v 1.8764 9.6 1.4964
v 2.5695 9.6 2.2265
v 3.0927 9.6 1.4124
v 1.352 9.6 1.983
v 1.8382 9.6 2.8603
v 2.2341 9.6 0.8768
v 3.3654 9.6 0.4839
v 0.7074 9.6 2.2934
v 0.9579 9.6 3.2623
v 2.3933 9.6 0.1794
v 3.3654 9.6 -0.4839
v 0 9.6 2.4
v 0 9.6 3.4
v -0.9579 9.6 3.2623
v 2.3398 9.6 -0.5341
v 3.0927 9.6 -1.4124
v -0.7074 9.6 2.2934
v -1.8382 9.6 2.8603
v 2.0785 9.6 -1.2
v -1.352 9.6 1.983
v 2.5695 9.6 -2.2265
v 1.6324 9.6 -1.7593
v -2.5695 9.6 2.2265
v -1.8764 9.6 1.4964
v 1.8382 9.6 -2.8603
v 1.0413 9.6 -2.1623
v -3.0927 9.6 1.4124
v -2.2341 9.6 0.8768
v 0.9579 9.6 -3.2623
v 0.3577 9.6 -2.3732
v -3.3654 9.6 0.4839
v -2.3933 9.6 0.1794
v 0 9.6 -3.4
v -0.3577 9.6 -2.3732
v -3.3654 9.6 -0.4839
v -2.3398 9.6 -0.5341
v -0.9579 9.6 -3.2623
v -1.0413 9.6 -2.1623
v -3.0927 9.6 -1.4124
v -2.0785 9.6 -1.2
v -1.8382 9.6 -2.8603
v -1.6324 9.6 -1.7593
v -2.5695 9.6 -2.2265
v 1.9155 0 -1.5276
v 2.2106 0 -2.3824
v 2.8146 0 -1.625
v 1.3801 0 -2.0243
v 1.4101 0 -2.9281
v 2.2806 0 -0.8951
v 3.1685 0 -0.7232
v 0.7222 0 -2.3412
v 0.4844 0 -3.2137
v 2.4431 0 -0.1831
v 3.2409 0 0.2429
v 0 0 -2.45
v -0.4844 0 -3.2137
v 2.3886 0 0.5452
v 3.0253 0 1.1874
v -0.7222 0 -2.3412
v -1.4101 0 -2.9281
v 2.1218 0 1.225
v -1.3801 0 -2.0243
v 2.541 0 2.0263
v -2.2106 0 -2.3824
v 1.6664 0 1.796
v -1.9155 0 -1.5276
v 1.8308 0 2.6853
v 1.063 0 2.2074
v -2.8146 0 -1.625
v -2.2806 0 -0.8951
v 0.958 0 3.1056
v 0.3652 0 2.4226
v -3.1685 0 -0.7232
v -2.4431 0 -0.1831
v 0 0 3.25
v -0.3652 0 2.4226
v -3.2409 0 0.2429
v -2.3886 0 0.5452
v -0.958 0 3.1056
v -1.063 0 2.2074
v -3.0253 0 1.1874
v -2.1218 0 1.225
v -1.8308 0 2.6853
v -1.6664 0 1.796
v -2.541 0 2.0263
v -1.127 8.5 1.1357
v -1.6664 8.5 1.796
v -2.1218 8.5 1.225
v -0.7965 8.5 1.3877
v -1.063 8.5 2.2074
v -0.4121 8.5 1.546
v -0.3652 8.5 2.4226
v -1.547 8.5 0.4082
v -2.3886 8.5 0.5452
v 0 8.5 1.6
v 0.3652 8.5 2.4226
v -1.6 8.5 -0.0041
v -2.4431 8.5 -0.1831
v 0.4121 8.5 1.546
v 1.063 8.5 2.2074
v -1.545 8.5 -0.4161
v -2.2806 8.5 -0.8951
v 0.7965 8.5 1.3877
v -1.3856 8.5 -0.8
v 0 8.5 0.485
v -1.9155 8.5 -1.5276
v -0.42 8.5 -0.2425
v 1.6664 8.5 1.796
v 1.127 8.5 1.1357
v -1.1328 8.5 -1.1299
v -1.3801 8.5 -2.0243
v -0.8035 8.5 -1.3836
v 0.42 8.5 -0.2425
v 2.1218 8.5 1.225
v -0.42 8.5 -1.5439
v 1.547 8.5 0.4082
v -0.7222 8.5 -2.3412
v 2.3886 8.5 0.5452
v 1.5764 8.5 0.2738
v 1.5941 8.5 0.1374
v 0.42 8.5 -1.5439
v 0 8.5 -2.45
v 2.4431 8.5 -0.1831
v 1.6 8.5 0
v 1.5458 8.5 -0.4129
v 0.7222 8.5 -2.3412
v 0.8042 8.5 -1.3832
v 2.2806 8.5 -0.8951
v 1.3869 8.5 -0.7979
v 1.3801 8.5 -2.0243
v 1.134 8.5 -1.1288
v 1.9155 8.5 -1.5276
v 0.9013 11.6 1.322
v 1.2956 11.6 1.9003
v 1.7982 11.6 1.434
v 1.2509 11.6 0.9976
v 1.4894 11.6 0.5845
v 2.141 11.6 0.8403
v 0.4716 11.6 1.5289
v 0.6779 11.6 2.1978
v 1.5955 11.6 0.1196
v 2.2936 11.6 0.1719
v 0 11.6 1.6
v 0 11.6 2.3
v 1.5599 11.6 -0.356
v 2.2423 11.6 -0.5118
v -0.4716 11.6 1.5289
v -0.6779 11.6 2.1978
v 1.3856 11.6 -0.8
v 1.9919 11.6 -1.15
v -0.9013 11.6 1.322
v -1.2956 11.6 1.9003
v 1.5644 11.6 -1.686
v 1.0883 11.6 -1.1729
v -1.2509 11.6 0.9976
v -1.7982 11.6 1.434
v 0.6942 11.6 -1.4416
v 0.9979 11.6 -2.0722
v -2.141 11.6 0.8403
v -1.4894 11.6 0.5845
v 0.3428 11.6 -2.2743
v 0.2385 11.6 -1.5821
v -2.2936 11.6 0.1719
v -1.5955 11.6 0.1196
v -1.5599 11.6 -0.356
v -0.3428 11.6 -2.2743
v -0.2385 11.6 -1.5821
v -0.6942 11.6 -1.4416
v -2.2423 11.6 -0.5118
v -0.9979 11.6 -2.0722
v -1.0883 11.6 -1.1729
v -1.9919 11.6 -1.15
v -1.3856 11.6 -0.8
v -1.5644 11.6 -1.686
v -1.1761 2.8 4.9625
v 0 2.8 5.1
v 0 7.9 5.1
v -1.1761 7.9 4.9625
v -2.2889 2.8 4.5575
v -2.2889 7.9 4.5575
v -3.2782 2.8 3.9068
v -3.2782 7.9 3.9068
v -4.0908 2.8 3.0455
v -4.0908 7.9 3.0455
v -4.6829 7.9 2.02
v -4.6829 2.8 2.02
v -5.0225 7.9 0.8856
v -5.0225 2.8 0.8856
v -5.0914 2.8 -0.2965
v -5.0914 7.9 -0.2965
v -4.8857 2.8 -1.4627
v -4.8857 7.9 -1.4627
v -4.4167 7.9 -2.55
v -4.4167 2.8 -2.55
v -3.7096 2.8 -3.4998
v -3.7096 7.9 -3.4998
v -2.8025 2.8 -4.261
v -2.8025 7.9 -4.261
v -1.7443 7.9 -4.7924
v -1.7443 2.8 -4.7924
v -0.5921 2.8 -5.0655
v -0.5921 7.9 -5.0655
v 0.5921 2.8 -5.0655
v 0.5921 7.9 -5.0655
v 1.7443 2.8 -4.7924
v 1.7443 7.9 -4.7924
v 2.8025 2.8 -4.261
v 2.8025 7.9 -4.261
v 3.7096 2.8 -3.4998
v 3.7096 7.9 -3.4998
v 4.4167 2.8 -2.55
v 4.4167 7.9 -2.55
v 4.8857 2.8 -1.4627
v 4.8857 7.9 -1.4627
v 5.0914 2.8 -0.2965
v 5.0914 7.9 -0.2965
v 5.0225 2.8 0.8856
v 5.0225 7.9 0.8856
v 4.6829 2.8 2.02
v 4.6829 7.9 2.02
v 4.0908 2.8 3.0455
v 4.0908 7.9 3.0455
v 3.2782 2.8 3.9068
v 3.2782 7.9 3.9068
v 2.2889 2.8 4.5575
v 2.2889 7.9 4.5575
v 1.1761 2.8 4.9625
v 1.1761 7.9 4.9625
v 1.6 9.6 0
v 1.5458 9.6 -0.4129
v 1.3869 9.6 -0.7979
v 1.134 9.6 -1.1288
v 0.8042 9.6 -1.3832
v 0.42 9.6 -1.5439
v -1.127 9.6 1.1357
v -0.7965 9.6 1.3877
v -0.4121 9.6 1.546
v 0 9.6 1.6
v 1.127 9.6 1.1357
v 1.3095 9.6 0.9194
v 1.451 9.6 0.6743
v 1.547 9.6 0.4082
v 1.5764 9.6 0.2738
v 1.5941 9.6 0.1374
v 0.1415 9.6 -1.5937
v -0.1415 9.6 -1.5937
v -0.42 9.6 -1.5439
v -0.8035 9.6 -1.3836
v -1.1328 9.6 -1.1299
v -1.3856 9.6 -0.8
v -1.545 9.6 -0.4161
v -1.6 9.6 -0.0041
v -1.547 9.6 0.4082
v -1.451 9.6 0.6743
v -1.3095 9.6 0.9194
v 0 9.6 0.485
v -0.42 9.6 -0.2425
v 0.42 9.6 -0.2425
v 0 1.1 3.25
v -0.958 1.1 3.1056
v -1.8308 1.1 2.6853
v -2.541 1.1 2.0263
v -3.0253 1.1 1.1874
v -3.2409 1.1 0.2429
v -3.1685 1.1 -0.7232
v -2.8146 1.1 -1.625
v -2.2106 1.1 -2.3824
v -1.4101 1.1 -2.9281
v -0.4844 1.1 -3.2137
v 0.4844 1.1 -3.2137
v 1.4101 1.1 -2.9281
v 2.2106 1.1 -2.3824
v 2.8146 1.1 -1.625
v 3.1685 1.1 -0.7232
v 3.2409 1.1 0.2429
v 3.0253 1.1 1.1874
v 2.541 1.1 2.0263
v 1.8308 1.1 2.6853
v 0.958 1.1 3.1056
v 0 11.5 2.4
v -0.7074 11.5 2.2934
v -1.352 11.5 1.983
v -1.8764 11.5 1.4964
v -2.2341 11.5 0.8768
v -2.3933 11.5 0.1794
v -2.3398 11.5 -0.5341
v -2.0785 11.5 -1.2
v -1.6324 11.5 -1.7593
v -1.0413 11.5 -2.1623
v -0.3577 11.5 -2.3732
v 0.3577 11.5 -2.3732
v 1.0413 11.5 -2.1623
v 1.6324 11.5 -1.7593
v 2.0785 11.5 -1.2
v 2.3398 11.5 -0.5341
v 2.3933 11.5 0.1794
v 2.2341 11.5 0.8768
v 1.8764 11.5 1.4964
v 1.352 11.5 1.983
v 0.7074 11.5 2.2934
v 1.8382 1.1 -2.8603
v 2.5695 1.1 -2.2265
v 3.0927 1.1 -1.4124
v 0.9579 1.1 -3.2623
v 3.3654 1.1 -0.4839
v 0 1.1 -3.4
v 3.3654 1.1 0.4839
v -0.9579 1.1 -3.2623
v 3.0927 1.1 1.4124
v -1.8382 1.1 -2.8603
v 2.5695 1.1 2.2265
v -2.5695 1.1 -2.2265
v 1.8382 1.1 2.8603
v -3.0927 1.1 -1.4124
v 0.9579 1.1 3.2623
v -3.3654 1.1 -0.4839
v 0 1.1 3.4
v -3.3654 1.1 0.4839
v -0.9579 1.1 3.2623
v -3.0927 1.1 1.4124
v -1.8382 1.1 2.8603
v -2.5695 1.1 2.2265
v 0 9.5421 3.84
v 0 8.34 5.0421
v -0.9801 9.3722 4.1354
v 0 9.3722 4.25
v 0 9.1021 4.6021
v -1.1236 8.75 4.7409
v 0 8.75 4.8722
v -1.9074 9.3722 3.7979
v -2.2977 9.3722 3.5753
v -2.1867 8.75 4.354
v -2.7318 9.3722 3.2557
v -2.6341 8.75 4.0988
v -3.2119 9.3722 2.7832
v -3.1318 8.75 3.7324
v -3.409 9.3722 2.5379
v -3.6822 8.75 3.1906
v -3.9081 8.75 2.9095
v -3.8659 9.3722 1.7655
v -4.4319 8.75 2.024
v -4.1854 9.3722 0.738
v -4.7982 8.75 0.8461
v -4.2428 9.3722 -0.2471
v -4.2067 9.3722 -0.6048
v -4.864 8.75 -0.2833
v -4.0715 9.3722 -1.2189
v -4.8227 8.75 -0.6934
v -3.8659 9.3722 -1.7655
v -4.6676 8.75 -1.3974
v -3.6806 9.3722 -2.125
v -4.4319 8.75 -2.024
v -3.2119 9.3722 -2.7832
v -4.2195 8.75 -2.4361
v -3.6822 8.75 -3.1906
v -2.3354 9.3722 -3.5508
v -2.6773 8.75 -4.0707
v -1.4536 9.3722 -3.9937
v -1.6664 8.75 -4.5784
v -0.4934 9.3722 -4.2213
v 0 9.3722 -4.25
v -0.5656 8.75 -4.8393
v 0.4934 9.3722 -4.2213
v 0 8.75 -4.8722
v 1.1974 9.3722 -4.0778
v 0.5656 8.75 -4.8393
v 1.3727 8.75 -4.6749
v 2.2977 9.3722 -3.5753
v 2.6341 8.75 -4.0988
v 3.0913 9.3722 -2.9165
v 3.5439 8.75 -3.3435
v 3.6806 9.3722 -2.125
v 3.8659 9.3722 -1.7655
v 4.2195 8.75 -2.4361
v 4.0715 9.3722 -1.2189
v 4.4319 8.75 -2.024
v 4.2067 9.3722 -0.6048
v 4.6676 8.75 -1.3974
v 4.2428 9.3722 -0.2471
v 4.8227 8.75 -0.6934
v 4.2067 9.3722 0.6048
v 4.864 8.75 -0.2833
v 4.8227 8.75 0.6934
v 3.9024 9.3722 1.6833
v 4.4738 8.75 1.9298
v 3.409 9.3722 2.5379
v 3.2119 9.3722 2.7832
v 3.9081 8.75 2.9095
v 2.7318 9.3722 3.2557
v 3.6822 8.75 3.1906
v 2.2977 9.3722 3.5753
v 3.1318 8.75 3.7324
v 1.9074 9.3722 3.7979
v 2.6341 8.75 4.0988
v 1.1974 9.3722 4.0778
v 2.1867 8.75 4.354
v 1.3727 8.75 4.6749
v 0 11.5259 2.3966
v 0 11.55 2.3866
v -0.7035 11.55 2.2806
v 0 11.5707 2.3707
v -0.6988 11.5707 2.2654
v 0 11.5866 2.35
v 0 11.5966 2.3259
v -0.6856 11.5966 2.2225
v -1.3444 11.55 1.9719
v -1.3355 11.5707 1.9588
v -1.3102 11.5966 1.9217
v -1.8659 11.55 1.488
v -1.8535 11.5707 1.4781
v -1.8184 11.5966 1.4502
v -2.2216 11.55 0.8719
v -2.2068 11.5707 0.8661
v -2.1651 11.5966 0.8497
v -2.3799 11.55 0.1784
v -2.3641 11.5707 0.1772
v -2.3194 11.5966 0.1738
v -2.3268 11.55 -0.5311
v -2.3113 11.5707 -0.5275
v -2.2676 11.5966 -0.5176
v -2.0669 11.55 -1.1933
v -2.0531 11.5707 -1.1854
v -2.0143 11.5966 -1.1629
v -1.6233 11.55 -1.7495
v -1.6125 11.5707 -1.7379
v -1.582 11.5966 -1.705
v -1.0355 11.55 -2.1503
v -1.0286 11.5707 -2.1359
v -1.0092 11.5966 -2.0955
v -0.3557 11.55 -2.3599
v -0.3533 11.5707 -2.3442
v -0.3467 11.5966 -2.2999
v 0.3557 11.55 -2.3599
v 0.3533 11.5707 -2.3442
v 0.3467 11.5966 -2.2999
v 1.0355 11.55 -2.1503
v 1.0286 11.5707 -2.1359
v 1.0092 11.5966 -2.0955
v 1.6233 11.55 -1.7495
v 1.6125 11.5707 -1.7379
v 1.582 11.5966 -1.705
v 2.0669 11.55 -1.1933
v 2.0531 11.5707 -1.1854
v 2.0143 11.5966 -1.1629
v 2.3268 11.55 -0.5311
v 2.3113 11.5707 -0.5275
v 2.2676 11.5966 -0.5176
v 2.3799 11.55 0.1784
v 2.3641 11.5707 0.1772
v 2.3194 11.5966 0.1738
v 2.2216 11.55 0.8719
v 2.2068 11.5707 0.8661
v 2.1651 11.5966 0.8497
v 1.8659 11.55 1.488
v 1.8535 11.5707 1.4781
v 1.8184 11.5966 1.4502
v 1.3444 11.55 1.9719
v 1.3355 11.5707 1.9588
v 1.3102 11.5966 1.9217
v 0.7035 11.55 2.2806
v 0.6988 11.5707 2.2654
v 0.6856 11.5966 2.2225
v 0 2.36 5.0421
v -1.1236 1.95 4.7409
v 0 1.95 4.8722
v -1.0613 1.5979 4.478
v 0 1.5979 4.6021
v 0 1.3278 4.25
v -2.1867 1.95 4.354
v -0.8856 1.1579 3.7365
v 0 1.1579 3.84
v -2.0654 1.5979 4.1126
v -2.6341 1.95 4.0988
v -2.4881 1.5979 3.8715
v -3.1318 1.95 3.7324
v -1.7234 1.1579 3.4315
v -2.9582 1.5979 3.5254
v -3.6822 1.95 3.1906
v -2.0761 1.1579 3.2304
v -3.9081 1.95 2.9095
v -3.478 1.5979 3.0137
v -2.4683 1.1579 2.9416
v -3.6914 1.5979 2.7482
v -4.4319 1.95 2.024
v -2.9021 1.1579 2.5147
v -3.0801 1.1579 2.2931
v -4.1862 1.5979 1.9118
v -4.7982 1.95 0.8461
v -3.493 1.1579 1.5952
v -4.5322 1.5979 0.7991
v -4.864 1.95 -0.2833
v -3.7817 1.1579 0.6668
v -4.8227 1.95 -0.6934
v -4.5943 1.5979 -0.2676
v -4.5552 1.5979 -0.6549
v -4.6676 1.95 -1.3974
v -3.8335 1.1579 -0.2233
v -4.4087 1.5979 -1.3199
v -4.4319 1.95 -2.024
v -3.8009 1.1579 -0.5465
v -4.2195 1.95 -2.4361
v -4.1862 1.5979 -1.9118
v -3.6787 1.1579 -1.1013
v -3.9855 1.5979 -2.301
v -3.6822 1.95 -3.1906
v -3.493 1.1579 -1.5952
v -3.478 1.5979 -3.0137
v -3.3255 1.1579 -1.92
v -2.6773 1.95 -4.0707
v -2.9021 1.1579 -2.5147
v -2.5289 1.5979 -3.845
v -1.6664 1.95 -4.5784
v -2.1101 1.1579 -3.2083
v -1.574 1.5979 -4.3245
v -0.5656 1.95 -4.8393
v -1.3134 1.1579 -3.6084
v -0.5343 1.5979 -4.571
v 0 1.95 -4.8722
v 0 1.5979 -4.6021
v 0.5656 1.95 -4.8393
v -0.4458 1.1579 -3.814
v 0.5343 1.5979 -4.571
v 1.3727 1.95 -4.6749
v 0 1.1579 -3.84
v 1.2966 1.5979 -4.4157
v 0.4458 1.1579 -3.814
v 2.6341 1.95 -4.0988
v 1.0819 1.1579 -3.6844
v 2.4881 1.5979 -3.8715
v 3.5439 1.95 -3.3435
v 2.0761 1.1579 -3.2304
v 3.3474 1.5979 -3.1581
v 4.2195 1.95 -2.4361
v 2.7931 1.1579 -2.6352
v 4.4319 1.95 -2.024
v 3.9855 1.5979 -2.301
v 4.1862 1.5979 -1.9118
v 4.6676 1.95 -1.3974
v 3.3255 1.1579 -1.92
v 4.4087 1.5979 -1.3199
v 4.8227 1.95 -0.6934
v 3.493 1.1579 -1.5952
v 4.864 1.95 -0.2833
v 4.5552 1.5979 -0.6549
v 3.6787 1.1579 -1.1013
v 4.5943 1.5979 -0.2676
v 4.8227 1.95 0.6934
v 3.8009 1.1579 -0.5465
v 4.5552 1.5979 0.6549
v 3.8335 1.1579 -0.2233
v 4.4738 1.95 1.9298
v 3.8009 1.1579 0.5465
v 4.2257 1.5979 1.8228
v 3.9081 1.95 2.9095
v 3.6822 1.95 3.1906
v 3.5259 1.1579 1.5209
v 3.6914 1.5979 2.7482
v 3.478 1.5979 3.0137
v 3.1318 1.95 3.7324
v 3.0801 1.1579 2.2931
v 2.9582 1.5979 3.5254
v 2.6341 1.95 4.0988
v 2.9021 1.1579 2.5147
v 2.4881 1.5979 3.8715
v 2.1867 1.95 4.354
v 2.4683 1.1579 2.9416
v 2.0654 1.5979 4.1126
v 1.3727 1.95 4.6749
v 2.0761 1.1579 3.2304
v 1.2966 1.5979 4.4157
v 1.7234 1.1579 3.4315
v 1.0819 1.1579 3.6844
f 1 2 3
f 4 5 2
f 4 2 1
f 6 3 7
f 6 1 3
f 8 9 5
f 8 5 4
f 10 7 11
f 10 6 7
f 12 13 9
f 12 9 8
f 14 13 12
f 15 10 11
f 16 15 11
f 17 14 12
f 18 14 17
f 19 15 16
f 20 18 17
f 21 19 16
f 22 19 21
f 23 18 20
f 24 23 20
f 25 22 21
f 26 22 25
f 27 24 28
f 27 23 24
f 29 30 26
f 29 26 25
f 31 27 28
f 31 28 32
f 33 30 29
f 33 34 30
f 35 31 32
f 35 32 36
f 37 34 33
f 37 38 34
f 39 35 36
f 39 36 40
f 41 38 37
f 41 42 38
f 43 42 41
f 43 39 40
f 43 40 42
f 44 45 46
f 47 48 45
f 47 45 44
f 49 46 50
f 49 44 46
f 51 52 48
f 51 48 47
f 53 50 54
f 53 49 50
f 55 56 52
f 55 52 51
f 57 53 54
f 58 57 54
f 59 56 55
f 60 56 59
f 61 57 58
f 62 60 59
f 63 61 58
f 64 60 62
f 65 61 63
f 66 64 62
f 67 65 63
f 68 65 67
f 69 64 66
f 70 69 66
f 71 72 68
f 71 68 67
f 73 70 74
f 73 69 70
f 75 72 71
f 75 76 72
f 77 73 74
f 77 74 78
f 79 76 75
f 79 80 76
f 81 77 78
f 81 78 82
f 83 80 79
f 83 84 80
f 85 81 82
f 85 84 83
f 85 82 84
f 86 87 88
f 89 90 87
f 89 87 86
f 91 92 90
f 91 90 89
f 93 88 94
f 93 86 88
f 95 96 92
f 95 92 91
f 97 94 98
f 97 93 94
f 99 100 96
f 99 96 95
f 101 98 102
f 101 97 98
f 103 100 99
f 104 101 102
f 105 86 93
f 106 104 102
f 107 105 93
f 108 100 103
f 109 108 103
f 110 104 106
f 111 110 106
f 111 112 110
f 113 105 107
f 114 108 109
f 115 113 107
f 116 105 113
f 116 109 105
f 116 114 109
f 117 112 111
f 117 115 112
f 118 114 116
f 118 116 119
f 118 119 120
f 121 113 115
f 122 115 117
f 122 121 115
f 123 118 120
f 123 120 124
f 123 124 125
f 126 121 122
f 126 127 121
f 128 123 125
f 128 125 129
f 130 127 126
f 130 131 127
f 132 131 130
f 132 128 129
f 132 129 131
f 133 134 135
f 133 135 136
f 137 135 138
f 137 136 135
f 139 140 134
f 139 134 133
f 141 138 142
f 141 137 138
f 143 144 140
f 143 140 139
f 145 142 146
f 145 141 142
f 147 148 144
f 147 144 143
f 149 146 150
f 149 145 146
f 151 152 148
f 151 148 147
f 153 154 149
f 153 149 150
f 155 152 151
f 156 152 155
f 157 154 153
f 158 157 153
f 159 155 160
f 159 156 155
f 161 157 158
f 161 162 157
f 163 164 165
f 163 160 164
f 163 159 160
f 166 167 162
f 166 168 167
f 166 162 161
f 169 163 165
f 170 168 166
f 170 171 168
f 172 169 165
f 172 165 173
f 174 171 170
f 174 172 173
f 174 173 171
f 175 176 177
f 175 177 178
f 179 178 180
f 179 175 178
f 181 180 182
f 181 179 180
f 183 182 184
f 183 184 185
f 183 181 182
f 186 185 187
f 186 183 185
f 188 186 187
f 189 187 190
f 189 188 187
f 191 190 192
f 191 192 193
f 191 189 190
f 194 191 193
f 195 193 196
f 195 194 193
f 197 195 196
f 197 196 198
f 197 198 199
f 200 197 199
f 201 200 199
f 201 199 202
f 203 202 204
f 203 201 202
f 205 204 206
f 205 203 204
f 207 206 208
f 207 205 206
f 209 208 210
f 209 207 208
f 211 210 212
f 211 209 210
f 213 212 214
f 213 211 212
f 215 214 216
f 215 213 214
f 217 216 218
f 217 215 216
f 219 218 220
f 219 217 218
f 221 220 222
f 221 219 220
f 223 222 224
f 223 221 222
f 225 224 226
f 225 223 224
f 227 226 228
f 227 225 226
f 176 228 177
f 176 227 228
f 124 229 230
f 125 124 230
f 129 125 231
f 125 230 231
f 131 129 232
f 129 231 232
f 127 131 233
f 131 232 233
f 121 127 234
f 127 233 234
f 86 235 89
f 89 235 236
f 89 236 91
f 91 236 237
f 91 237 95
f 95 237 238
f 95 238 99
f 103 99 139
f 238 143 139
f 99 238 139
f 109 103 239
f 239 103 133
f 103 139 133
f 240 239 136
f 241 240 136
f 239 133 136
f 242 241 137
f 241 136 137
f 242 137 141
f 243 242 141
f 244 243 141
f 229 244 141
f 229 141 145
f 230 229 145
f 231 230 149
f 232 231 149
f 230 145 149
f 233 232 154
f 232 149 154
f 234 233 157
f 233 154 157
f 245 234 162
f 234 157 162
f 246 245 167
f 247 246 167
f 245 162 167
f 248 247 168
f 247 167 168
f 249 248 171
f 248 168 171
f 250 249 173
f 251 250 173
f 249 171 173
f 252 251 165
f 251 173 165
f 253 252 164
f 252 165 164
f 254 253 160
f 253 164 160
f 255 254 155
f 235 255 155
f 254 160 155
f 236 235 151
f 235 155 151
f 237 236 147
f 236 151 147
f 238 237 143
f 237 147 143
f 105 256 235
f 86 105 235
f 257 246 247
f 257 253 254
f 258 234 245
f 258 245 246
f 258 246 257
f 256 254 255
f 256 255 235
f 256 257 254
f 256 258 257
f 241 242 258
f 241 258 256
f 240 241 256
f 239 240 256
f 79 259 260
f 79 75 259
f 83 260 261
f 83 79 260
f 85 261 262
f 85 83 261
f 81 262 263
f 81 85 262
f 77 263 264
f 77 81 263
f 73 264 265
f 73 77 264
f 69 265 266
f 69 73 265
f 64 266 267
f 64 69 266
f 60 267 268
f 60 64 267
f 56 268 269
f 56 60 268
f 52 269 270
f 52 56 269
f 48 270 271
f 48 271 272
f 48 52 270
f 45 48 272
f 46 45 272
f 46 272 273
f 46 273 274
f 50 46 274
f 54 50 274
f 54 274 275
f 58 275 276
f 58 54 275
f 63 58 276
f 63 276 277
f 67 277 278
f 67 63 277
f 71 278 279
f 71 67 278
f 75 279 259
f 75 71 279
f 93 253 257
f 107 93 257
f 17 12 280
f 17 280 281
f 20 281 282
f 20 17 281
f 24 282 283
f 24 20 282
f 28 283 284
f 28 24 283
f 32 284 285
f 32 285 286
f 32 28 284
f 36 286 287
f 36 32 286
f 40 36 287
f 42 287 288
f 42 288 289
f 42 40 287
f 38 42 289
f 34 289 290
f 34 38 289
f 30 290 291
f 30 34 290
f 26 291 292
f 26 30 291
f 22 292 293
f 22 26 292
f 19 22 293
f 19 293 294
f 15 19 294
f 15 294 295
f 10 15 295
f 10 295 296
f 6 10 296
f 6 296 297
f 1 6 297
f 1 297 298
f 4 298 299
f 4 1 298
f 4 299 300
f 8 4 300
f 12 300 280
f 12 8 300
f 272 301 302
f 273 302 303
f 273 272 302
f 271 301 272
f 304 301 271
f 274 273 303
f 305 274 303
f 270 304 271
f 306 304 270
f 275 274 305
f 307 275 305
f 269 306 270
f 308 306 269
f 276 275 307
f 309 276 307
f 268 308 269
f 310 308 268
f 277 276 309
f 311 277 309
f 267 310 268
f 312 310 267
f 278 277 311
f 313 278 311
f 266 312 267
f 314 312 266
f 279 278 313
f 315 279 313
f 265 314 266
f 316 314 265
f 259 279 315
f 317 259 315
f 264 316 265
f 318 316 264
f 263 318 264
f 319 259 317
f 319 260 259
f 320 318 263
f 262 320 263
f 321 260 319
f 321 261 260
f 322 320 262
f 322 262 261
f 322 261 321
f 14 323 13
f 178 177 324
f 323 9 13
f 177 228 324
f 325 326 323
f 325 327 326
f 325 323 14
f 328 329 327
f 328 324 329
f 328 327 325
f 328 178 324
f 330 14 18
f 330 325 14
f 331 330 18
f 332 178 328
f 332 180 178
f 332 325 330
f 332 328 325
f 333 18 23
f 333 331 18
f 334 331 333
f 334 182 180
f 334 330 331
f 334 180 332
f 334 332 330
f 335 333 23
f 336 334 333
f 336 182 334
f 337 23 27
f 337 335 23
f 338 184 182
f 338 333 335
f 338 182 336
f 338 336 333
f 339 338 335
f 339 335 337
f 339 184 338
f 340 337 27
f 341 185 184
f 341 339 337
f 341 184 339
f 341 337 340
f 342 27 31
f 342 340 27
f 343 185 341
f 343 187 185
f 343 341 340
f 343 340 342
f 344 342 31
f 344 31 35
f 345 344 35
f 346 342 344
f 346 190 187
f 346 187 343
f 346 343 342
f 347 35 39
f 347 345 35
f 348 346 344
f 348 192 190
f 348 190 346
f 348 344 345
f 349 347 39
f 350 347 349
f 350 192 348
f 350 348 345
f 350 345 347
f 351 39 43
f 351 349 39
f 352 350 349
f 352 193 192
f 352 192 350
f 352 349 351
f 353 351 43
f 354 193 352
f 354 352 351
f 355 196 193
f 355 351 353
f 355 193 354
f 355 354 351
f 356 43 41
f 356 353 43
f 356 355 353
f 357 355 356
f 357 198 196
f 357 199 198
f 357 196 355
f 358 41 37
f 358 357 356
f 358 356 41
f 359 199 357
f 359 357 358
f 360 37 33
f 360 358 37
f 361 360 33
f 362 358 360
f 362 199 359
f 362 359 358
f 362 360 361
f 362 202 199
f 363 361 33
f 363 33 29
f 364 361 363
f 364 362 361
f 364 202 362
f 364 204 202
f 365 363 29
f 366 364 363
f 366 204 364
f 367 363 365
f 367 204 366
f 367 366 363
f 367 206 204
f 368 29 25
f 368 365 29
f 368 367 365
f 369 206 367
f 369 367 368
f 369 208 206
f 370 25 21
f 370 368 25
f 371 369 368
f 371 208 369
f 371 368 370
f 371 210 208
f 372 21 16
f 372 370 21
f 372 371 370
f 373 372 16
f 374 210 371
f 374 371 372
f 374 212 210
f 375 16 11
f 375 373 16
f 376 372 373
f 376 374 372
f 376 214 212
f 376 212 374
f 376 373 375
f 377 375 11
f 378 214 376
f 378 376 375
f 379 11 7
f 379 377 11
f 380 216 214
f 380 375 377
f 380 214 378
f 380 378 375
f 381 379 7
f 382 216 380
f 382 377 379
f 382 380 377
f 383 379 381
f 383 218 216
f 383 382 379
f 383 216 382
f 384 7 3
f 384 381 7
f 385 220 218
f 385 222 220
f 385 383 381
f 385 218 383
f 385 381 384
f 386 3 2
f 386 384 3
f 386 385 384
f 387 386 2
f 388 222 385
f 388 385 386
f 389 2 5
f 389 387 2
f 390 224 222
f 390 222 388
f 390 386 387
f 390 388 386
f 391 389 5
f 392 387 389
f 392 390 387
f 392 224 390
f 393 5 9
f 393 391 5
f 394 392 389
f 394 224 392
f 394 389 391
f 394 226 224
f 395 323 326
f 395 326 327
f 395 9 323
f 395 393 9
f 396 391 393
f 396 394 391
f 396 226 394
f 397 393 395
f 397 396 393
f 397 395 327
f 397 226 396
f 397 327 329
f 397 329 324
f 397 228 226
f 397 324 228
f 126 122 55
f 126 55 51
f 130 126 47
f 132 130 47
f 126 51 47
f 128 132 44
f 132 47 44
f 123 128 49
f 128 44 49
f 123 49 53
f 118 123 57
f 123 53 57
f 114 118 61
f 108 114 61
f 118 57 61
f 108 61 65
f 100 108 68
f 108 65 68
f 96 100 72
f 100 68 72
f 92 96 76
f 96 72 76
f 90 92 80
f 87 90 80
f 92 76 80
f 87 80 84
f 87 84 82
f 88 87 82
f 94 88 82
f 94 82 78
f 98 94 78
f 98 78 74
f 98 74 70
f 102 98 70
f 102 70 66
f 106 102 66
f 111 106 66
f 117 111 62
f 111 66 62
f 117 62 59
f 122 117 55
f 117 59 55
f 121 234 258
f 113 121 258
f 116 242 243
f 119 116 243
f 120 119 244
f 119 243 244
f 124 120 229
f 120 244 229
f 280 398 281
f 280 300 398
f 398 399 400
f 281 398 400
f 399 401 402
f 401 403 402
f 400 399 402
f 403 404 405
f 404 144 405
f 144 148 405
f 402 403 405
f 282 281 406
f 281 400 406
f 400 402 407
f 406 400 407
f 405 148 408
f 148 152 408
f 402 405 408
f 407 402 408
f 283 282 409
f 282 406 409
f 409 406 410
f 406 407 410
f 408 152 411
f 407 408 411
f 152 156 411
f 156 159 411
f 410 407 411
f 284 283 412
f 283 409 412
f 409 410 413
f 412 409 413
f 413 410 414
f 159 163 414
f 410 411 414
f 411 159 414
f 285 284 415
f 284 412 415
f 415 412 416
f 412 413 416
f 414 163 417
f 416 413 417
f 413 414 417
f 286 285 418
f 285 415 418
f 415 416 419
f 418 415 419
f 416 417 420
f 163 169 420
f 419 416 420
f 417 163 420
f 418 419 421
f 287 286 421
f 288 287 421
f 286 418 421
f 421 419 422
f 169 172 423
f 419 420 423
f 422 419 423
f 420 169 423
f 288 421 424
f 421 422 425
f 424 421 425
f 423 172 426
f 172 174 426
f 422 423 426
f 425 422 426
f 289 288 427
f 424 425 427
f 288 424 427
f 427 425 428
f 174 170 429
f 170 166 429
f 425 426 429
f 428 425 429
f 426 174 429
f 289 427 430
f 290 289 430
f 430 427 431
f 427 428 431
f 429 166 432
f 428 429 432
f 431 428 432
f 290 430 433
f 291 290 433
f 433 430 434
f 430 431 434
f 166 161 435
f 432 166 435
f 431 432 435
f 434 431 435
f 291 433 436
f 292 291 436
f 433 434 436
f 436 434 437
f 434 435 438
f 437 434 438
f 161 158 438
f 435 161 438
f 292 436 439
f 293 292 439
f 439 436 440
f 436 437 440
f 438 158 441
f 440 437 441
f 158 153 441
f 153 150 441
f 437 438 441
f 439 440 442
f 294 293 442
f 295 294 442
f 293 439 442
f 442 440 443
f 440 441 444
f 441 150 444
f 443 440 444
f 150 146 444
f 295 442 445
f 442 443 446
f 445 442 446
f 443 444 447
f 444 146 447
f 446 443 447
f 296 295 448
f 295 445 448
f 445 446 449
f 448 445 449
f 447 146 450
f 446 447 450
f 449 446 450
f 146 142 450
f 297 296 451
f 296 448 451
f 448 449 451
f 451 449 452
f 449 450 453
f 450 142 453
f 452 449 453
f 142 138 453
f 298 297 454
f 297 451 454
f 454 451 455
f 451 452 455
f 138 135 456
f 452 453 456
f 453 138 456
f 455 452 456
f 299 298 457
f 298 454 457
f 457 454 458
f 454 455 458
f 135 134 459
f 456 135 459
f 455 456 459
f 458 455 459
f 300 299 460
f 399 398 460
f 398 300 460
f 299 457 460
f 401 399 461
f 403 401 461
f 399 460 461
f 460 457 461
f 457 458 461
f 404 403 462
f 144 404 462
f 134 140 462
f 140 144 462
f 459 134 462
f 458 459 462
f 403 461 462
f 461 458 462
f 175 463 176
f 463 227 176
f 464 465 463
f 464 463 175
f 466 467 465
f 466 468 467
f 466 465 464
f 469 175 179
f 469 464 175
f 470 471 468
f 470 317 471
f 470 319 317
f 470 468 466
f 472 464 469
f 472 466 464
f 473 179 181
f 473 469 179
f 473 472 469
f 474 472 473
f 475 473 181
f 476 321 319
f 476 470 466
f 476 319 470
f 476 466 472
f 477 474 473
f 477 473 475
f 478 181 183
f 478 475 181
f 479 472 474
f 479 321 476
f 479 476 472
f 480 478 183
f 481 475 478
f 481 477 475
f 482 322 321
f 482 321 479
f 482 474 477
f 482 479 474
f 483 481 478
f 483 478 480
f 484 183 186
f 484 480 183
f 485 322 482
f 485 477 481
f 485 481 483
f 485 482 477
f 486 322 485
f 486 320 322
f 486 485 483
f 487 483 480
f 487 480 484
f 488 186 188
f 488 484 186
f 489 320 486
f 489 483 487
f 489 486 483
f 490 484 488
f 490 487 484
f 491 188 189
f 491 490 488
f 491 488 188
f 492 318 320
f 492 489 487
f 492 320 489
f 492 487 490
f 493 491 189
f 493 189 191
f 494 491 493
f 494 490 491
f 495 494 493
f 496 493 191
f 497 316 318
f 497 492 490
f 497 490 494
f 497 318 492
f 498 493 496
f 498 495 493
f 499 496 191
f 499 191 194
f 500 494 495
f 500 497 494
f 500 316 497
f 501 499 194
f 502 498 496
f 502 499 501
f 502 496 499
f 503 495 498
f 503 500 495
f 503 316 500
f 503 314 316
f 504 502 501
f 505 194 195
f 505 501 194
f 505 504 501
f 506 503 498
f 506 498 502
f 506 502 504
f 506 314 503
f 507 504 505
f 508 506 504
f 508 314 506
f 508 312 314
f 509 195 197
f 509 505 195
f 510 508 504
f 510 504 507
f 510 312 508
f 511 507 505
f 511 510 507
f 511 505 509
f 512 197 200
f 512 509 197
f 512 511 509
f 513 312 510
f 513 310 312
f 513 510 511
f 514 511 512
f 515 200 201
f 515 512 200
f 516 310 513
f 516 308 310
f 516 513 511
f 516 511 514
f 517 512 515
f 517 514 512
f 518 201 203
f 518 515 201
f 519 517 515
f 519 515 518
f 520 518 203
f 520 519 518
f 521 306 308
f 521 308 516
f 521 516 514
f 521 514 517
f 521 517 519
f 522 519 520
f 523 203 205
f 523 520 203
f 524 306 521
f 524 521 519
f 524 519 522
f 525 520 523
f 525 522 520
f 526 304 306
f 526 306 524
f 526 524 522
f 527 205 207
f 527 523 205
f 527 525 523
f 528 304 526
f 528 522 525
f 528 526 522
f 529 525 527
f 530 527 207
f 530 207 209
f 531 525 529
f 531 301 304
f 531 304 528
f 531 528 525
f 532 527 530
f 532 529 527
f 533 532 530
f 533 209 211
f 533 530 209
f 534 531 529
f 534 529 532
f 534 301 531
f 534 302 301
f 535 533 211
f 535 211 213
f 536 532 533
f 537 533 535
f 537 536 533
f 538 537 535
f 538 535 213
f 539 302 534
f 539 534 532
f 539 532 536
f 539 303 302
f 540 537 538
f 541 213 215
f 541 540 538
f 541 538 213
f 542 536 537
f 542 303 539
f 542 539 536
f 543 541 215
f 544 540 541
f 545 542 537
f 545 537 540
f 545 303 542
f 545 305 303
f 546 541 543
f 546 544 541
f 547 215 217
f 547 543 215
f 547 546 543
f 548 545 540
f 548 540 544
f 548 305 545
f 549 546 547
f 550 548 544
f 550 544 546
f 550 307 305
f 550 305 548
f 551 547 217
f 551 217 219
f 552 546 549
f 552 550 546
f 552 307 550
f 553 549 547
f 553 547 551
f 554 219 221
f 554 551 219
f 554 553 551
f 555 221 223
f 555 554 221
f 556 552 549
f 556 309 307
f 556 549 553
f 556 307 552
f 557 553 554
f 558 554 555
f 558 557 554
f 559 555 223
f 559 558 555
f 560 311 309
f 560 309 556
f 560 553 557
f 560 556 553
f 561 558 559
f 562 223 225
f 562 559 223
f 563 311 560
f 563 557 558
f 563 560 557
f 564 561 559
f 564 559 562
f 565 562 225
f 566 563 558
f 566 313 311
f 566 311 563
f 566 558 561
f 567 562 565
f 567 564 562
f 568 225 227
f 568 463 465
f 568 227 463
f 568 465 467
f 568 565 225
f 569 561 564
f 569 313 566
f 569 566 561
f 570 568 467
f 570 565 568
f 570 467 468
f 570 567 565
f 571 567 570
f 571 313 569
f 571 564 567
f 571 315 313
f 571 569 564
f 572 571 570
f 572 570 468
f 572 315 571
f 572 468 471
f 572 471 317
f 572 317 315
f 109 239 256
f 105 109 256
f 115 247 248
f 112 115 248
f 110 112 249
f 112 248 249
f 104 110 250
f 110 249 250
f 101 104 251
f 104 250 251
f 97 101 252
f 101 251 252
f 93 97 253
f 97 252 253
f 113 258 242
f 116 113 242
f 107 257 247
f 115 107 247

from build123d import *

# Parameters (mm, degrees)
FILLET1_R          = 1.7
SKETCH2_R          = 1.6
CUT_EXTRUDE1_DEPTH = 2
CUT_EXTRUDE2_DEPTH = 13.0074977
SKETCH4_R          = 2.45
CUT_EXTRUDE3_DEPTH = 8.5
FILLET2_R          = 0.1


with BuildPart() as part:
    # Sketch1 → Revolve1 (revolve)
    with BuildSketch(Plane.XY, mode=Mode.PRIVATE) as revolve1_sk:
        Polygon((0, 11.6), (2.4, 11.6), (2.4, 9.6), (5.1, 9.6), (5.1, 1.1), (3.25, 1.1), (3.25, 0), (0, 0), align=None)
    revolve(revolve1_sk.sketch.rotate(Axis((0, 161.315789474, 0), (0, -1, 0)), 90), axis=Axis((0, 161.315789474, 0), (0, -1, 0)))

    # Fillet1
    fillet1_edges = [part.edges().sort_by_distance(p)[0] for p in [
        (0, 1.1, -5.1),
        (0, 9.6, -5.1),
    ]]
    fillet(fillet1_edges, radius=FILLET1_R)

    # Sketch2 → Cut-Extrude1 (cut)
    with BuildSketch(Plane(origin=(0, 11.6, 0), x_dir=(1, 0, 0), z_dir=(0, 1, 0))):
        with Locations(Location((0, 0, 0), (0, 0, 270))):
            Circle(SKETCH2_R)
    extrude(amount=-CUT_EXTRUDE1_DEPTH, mode=Mode.SUBTRACT)

    # Sketch3 → Cut-Extrude2 (cut, through all)
    with BuildSketch(Plane(origin=(0, 9.6, 0), x_dir=(1, 0, 0), z_dir=(0, 1, 0))):
        with BuildLine():
            Line((-0.42, 0.242487113), (-0.42, 1.543891188))
            ThreePointArc((-0.42, 1.543891188), (-1.385640646, 0.8), (-1.547048989, -0.408214924))
            Line((-1.547048989, -0.408214924), (-0.42, 0.242487113))
        make_face()
        with BuildLine():
            ThreePointArc((1.6, 0), (1.271219887, 0.971596624), (0.42, 1.543891188))
            Line((0.42, 1.543891188), (0.42, 0.242487113))
            Line((0.42, 0.242487113), (1.547048989, -0.408214924))
            ThreePointArc((1.547048989, -0.408214924), (1.586707028, -0.205817415), (1.6, 0))
        make_face()
        with BuildLine():
            Line((0, -0.484974226), (-1.127048989, -1.135676264))
            ThreePointArc((-1.127048989, -1.135676264), (0, -1.6), (1.127048989, -1.135676264))
            Line((1.127048989, -1.135676264), (0, -0.484974226))
        make_face()
    extrude(amount=-CUT_EXTRUDE2_DEPTH, mode=Mode.SUBTRACT)

    # Sketch4 → Cut-Extrude3 (cut)
    with BuildSketch(Plane.XZ):
        with Locations(Location((0, 0, 0), (0, 0, 270))):
            Circle(SKETCH4_R)
    extrude(amount=-CUT_EXTRUDE3_DEPTH, mode=Mode.SUBTRACT)

    # Fillet2
    fillet2_edges = [part.edges().sort_by_distance(p)[0] for p in [
        (0, 11.6, -2.4),
    ]]
    fillet(fillet2_edges, radius=FILLET2_R)


solid = part.part
